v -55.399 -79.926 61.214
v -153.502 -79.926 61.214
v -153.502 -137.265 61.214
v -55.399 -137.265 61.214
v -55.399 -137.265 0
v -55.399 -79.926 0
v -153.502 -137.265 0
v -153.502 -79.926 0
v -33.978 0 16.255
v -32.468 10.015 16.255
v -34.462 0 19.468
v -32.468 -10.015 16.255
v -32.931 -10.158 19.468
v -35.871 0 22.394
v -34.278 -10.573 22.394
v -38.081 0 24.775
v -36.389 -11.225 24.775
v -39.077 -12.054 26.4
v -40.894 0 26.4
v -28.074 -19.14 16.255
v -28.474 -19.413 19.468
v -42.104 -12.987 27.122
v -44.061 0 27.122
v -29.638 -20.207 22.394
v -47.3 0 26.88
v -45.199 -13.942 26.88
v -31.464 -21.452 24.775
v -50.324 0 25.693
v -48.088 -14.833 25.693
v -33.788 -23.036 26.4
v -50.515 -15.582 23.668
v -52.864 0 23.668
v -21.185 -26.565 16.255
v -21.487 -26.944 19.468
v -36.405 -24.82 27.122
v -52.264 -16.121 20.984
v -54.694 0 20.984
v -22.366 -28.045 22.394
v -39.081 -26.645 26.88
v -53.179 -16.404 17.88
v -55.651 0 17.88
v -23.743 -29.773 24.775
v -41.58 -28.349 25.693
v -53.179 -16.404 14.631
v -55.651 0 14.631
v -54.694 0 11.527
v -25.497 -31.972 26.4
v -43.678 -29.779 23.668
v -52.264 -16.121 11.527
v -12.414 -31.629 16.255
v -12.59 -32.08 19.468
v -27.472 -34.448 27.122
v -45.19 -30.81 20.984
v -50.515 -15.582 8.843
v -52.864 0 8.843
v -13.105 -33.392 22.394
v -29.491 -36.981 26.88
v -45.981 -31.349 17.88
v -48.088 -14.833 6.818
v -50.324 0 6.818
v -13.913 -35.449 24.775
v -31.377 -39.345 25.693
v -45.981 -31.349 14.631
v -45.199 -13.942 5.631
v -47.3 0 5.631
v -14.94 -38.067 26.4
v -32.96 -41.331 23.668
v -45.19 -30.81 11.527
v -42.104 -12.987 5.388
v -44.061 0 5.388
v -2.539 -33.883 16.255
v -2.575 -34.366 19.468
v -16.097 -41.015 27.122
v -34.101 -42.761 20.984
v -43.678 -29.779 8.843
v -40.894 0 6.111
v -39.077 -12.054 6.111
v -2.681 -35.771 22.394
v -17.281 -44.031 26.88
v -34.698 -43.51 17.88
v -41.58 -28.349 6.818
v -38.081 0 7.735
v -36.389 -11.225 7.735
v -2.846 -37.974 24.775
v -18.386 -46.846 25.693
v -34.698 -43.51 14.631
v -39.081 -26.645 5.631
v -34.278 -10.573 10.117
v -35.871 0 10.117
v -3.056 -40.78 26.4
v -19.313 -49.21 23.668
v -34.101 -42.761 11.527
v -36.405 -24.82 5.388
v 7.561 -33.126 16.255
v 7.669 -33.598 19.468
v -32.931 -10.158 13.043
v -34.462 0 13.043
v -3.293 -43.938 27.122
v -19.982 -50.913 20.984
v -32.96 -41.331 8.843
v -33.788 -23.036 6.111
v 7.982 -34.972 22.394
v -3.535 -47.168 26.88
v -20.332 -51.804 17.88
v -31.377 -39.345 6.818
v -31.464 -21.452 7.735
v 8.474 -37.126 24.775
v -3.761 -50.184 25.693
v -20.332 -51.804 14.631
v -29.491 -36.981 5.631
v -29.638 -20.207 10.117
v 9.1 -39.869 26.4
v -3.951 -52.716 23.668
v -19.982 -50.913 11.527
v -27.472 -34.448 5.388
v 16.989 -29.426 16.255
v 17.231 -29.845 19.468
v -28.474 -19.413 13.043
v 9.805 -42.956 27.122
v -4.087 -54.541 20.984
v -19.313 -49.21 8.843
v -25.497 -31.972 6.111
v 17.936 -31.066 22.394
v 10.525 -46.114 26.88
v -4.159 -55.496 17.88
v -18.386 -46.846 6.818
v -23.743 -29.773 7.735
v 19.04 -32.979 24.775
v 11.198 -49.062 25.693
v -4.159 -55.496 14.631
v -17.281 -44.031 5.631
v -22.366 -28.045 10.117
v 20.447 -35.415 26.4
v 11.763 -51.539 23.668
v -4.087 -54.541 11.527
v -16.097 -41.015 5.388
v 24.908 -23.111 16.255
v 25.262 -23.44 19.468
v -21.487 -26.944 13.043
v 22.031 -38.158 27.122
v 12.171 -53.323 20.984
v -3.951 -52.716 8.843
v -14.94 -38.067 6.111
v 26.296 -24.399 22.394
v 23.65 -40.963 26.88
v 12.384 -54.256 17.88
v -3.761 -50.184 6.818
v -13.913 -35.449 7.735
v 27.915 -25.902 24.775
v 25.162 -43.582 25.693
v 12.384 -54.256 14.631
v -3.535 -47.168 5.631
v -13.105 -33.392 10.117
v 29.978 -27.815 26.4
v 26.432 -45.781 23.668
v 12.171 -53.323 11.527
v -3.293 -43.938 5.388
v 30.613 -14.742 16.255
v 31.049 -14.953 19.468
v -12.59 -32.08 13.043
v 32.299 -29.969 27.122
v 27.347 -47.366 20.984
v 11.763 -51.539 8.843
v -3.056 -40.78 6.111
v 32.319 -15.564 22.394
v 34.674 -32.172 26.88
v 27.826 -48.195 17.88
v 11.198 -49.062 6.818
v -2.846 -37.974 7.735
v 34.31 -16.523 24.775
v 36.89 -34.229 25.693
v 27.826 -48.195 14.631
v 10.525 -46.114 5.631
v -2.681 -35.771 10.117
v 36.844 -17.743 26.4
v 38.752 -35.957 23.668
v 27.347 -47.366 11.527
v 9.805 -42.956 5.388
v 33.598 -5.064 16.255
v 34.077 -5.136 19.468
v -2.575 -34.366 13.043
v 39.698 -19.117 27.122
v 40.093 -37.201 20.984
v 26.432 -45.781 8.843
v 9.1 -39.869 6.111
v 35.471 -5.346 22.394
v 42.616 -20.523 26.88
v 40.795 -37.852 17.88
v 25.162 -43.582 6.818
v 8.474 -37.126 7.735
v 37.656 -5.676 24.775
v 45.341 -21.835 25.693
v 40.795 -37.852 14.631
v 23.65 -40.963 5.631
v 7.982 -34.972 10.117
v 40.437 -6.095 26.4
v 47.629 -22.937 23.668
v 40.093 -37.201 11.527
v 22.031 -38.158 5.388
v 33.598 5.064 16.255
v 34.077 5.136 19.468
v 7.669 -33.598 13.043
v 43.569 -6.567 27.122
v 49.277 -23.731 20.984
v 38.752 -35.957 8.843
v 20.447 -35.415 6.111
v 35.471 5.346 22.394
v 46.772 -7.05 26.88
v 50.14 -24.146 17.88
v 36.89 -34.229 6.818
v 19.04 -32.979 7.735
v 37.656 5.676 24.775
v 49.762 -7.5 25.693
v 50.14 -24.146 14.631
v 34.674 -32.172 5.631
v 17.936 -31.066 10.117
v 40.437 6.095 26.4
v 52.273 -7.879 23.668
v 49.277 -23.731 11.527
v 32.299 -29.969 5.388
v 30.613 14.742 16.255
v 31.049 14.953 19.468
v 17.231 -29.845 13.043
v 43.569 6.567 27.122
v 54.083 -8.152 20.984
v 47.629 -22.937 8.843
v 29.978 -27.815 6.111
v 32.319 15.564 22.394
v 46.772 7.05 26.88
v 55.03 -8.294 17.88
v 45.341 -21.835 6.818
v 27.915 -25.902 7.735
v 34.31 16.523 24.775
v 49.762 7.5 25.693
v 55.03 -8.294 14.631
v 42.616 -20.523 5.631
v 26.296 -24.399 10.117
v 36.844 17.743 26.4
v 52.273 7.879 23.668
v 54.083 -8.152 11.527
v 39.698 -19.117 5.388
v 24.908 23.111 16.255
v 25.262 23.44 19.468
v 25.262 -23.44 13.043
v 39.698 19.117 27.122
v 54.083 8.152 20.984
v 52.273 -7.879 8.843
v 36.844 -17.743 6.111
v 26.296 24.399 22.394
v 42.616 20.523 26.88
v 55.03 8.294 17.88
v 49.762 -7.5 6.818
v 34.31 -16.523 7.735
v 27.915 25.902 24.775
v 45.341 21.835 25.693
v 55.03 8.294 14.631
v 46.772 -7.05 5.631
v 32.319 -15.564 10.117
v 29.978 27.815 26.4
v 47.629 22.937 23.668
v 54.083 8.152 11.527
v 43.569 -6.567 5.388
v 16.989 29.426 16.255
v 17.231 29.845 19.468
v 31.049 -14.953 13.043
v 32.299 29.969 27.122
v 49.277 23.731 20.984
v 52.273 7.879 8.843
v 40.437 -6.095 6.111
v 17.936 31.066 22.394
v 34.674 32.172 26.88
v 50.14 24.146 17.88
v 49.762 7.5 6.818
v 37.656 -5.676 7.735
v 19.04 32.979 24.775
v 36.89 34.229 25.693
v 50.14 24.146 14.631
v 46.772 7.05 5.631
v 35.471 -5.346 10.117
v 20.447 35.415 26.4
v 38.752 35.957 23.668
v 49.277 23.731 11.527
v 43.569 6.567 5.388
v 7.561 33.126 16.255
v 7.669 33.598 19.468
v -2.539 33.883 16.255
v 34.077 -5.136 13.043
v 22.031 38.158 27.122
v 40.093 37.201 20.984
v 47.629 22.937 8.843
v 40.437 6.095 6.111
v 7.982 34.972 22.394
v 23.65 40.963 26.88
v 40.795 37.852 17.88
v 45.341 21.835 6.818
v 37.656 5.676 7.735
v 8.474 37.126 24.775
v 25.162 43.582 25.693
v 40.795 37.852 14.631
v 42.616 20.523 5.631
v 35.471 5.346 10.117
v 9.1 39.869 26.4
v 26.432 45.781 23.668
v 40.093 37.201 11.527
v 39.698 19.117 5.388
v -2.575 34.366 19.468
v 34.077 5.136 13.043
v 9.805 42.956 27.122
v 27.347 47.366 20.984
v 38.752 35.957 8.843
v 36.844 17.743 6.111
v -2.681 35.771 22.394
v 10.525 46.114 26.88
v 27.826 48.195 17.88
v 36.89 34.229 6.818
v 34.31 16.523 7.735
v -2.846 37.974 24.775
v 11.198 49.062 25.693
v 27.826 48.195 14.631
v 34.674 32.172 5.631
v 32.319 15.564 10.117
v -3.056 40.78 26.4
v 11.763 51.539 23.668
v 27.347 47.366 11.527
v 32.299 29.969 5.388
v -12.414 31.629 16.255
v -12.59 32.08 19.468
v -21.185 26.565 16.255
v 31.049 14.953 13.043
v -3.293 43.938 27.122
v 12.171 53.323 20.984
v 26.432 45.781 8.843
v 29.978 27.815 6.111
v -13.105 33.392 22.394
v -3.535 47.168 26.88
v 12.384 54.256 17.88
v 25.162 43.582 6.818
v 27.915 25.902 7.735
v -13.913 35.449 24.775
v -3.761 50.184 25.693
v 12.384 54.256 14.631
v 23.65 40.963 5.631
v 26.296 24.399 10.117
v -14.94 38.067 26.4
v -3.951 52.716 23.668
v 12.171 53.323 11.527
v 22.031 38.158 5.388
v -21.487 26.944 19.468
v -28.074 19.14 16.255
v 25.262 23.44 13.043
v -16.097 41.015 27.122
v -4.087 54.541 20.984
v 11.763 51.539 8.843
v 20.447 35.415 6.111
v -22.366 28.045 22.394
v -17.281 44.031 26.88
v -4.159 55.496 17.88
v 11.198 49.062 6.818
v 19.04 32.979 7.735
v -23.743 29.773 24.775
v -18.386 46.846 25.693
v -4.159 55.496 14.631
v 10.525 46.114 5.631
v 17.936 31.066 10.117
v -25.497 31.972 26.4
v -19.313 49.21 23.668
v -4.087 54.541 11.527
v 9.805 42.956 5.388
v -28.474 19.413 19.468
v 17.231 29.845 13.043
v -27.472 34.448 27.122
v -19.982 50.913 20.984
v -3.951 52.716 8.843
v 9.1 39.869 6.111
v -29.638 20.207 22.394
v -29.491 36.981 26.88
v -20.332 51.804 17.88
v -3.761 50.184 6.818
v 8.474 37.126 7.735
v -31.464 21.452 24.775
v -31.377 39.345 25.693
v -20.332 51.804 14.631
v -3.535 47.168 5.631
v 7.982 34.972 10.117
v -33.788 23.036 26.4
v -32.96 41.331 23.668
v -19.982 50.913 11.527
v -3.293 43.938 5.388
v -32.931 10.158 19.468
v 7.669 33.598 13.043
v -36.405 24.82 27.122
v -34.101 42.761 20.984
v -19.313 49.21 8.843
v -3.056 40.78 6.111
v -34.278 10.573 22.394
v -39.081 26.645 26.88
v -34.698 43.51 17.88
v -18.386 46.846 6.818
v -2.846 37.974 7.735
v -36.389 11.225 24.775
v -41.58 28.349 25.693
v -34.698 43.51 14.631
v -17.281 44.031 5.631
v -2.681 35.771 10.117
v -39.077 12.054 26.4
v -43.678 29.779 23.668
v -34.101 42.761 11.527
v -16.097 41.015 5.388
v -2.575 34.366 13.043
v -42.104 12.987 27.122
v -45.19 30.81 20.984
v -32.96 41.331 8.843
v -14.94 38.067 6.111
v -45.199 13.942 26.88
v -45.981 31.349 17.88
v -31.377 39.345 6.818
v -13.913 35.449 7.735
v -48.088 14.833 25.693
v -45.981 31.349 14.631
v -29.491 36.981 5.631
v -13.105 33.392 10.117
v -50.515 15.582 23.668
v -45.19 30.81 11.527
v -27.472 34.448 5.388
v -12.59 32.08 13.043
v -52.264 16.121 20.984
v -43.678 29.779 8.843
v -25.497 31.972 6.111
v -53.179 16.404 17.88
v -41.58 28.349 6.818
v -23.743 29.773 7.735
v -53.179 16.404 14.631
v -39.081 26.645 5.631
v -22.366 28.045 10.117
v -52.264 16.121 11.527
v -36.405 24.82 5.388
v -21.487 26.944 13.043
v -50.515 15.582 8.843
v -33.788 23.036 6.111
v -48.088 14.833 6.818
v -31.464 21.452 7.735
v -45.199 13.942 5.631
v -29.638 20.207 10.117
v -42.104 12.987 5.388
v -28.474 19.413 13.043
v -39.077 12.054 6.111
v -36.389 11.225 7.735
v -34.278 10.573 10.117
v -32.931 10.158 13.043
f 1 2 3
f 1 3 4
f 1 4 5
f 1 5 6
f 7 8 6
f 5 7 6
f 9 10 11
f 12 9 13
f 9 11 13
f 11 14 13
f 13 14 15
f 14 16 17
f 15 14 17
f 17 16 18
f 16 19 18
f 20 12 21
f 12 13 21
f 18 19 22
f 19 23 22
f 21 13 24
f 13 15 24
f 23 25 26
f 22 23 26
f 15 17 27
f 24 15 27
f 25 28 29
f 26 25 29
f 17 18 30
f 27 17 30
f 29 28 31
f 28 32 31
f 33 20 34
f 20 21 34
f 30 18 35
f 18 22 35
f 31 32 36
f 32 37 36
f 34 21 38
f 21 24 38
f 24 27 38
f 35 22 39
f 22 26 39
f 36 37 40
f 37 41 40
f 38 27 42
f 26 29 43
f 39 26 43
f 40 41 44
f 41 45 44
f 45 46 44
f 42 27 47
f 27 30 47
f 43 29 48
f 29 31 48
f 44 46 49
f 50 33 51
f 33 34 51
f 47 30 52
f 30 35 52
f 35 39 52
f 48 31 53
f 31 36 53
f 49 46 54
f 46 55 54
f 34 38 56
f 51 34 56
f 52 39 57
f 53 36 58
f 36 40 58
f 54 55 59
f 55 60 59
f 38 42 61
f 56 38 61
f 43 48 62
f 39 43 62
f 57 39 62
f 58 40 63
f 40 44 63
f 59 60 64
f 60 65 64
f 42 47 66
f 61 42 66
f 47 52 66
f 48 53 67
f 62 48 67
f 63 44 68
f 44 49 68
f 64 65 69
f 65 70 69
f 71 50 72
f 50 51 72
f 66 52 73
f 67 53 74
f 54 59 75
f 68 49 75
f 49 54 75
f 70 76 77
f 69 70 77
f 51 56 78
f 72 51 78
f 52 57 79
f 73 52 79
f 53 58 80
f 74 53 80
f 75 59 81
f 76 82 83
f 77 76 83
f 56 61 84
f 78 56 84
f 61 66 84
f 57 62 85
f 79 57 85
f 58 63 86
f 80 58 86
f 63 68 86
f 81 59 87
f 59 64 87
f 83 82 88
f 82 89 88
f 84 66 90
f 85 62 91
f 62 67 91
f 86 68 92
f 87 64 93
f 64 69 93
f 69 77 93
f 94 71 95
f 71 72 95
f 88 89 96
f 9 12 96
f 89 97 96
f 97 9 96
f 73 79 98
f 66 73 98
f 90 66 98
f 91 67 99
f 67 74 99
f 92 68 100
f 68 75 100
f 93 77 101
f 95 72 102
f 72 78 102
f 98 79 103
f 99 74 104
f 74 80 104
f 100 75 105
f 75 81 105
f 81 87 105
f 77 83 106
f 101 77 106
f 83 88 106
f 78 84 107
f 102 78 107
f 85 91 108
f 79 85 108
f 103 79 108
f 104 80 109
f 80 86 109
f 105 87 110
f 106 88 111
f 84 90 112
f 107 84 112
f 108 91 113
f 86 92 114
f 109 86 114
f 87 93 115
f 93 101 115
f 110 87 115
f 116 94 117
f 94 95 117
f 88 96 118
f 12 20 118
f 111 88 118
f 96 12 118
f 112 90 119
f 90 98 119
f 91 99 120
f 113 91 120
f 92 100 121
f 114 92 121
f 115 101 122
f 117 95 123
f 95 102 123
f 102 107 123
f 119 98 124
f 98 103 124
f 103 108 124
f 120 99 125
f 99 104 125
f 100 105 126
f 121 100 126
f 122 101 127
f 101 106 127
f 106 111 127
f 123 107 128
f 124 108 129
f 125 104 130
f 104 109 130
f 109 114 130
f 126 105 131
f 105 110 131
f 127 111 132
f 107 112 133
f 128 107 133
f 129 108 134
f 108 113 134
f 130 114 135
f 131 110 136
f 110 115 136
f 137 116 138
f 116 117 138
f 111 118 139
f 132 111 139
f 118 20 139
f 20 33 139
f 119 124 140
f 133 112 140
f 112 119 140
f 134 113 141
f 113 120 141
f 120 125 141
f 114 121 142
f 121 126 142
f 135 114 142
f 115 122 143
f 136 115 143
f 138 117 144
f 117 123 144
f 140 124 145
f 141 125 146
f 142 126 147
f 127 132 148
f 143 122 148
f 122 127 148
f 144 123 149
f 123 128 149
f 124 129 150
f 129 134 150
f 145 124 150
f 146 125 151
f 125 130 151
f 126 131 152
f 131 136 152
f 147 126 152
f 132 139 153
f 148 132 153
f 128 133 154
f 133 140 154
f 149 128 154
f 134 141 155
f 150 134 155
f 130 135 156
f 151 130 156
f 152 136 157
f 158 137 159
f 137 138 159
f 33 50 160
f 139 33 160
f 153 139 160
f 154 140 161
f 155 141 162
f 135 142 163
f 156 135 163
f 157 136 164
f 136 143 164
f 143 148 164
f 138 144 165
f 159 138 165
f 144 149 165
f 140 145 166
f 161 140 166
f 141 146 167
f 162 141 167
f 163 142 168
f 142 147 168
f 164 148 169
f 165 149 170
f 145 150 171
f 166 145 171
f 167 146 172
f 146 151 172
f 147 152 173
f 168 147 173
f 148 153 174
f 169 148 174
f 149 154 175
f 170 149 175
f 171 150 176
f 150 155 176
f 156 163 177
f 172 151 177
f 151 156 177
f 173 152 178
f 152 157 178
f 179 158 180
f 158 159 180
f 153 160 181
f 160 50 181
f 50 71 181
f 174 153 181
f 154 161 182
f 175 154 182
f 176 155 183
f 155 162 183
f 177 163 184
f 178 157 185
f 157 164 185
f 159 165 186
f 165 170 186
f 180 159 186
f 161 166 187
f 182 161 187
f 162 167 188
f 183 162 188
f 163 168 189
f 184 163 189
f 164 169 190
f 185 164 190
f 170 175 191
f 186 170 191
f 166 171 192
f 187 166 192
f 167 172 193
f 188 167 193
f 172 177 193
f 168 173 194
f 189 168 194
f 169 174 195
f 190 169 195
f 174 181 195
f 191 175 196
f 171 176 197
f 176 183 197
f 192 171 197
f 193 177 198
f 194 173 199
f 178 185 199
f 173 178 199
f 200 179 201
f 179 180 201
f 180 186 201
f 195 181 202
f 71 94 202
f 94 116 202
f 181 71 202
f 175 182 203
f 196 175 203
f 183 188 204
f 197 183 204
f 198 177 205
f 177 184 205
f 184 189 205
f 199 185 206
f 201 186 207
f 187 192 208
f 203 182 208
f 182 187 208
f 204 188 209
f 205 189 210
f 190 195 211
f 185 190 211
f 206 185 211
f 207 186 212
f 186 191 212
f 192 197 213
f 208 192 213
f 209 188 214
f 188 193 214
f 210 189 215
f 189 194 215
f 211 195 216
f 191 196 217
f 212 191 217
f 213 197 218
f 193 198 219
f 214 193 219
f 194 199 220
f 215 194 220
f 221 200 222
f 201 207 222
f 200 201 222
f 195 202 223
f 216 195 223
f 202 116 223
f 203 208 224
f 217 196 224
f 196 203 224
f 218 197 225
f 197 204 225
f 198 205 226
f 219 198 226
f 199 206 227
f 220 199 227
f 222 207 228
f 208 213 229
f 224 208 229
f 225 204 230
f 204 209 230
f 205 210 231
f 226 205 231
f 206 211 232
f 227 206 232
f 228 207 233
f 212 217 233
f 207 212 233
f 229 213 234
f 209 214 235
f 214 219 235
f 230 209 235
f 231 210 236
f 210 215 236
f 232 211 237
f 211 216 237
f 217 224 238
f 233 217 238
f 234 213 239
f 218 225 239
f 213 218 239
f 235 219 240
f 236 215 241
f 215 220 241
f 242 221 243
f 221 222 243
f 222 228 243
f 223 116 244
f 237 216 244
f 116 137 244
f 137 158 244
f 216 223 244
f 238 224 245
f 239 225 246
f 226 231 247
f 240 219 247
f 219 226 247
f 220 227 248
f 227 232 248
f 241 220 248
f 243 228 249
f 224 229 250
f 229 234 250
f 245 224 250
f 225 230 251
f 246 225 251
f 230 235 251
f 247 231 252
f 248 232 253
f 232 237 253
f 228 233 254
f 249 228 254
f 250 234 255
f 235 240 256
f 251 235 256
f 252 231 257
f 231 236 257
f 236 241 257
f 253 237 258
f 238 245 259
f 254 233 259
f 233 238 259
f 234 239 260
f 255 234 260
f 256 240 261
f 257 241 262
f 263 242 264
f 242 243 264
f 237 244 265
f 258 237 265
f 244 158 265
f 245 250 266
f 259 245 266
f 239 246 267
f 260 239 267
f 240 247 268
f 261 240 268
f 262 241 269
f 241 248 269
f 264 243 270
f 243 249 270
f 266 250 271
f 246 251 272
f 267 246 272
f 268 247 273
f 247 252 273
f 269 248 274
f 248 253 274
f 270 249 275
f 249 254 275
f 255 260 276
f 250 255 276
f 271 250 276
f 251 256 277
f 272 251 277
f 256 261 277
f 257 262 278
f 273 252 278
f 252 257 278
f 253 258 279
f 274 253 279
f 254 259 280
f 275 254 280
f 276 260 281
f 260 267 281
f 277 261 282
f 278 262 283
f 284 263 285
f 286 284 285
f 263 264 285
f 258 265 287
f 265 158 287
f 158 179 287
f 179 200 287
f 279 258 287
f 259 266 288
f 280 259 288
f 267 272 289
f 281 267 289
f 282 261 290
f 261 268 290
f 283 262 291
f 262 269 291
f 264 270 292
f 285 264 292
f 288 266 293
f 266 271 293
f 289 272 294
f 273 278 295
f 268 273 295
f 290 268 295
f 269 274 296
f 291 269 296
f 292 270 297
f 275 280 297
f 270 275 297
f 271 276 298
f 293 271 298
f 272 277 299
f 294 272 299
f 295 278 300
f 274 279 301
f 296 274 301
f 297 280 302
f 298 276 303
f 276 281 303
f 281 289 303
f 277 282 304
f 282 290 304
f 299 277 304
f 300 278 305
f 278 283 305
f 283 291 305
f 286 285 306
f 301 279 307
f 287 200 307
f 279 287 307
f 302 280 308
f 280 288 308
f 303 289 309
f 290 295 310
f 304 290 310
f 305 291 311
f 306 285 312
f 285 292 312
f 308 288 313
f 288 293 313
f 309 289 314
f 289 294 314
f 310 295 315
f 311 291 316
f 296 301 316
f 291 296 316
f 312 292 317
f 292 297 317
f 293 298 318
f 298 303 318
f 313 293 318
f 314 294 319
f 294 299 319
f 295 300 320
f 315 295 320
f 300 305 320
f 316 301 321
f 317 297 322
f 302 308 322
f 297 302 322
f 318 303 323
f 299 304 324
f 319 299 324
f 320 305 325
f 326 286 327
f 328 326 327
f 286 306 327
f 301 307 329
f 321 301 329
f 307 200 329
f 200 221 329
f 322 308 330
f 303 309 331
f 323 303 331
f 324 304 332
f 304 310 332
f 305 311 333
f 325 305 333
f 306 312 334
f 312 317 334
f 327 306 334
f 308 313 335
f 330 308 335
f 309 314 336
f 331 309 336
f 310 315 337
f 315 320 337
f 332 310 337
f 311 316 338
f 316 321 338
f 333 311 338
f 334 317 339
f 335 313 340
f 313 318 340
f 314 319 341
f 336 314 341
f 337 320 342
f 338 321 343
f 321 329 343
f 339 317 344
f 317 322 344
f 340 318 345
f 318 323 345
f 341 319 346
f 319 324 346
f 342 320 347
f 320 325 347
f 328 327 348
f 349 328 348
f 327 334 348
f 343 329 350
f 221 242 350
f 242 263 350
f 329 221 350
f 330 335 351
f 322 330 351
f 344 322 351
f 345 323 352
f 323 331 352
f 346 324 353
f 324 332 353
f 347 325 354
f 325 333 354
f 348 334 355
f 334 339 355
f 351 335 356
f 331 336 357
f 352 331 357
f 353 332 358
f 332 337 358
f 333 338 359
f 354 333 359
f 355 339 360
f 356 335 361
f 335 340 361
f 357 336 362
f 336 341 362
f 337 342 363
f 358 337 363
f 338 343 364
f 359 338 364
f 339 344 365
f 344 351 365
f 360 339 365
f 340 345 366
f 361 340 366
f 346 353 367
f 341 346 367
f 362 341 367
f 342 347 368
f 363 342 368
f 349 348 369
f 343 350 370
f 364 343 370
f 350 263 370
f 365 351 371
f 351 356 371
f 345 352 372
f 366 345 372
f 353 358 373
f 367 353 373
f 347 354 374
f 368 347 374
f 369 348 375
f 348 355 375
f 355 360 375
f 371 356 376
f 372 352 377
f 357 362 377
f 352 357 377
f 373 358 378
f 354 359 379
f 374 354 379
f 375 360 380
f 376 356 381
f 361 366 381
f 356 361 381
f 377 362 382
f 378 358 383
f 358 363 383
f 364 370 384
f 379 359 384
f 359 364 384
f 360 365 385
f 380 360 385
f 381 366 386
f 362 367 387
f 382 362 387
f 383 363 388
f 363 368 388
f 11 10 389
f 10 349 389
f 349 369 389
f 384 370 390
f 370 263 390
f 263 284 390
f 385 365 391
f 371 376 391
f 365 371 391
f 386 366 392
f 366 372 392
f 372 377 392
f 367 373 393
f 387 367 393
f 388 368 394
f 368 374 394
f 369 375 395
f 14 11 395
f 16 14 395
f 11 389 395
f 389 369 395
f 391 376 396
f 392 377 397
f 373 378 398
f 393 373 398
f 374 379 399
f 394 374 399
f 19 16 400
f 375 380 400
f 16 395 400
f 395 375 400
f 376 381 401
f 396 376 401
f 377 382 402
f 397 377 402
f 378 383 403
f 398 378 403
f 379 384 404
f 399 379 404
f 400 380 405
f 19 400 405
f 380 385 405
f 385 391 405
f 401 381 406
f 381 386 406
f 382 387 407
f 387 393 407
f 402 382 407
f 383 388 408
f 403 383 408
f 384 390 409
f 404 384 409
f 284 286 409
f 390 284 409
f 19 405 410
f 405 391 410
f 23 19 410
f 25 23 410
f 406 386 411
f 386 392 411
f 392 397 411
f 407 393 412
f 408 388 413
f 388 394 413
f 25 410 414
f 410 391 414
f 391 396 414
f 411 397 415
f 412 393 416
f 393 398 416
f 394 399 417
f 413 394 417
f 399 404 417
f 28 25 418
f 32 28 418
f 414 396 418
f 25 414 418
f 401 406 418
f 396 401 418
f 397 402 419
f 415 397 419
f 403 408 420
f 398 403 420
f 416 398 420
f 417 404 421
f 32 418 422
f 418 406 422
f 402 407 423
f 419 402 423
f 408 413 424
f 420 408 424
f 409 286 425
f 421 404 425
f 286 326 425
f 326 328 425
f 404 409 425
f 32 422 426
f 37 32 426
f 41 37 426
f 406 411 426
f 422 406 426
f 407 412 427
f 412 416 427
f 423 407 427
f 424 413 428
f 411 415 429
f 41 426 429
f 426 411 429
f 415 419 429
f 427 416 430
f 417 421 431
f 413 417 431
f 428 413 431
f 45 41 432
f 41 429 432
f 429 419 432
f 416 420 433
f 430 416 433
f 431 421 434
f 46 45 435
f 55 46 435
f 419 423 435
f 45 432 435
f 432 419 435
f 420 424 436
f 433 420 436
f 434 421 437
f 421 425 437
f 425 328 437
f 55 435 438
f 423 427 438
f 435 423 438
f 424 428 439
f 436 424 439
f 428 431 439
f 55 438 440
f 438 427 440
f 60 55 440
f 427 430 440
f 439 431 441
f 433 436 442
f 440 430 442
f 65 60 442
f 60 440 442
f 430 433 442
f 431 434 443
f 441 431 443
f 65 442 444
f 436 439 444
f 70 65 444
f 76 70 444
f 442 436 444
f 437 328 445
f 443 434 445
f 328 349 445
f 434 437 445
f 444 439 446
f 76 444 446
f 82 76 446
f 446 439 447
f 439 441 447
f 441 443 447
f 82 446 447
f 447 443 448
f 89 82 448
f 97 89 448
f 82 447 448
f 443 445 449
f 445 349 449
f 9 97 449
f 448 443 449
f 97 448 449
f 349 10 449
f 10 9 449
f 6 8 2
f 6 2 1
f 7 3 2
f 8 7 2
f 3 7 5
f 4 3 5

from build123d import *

# Parameters (mm, degrees)
F0_R     = 10.897546
F2_W     = 98.102853
F2_H     = 57.338565
F3_DEPTH = 61.214


with BuildPart() as f1:
    # F0 (on Front) → F1 (revolve)
    with BuildSketch(Plane.XZ):
        with Locations((-44.875454, 16.255407)):
            Circle(F0_R)
    revolve(axis=Axis((0, 0, 26.729299), (0, 0, 1)))


with BuildPart() as f3:
    # F2 (on Top) → F3 (new body)
    with BuildSketch(Plane.XY):
        with Locations((-104.450204, -108.595758)):
            Rectangle(F2_W, F2_H)
    extrude(amount=F3_DEPTH)


solid = Compound([f1.part, f3.part])
